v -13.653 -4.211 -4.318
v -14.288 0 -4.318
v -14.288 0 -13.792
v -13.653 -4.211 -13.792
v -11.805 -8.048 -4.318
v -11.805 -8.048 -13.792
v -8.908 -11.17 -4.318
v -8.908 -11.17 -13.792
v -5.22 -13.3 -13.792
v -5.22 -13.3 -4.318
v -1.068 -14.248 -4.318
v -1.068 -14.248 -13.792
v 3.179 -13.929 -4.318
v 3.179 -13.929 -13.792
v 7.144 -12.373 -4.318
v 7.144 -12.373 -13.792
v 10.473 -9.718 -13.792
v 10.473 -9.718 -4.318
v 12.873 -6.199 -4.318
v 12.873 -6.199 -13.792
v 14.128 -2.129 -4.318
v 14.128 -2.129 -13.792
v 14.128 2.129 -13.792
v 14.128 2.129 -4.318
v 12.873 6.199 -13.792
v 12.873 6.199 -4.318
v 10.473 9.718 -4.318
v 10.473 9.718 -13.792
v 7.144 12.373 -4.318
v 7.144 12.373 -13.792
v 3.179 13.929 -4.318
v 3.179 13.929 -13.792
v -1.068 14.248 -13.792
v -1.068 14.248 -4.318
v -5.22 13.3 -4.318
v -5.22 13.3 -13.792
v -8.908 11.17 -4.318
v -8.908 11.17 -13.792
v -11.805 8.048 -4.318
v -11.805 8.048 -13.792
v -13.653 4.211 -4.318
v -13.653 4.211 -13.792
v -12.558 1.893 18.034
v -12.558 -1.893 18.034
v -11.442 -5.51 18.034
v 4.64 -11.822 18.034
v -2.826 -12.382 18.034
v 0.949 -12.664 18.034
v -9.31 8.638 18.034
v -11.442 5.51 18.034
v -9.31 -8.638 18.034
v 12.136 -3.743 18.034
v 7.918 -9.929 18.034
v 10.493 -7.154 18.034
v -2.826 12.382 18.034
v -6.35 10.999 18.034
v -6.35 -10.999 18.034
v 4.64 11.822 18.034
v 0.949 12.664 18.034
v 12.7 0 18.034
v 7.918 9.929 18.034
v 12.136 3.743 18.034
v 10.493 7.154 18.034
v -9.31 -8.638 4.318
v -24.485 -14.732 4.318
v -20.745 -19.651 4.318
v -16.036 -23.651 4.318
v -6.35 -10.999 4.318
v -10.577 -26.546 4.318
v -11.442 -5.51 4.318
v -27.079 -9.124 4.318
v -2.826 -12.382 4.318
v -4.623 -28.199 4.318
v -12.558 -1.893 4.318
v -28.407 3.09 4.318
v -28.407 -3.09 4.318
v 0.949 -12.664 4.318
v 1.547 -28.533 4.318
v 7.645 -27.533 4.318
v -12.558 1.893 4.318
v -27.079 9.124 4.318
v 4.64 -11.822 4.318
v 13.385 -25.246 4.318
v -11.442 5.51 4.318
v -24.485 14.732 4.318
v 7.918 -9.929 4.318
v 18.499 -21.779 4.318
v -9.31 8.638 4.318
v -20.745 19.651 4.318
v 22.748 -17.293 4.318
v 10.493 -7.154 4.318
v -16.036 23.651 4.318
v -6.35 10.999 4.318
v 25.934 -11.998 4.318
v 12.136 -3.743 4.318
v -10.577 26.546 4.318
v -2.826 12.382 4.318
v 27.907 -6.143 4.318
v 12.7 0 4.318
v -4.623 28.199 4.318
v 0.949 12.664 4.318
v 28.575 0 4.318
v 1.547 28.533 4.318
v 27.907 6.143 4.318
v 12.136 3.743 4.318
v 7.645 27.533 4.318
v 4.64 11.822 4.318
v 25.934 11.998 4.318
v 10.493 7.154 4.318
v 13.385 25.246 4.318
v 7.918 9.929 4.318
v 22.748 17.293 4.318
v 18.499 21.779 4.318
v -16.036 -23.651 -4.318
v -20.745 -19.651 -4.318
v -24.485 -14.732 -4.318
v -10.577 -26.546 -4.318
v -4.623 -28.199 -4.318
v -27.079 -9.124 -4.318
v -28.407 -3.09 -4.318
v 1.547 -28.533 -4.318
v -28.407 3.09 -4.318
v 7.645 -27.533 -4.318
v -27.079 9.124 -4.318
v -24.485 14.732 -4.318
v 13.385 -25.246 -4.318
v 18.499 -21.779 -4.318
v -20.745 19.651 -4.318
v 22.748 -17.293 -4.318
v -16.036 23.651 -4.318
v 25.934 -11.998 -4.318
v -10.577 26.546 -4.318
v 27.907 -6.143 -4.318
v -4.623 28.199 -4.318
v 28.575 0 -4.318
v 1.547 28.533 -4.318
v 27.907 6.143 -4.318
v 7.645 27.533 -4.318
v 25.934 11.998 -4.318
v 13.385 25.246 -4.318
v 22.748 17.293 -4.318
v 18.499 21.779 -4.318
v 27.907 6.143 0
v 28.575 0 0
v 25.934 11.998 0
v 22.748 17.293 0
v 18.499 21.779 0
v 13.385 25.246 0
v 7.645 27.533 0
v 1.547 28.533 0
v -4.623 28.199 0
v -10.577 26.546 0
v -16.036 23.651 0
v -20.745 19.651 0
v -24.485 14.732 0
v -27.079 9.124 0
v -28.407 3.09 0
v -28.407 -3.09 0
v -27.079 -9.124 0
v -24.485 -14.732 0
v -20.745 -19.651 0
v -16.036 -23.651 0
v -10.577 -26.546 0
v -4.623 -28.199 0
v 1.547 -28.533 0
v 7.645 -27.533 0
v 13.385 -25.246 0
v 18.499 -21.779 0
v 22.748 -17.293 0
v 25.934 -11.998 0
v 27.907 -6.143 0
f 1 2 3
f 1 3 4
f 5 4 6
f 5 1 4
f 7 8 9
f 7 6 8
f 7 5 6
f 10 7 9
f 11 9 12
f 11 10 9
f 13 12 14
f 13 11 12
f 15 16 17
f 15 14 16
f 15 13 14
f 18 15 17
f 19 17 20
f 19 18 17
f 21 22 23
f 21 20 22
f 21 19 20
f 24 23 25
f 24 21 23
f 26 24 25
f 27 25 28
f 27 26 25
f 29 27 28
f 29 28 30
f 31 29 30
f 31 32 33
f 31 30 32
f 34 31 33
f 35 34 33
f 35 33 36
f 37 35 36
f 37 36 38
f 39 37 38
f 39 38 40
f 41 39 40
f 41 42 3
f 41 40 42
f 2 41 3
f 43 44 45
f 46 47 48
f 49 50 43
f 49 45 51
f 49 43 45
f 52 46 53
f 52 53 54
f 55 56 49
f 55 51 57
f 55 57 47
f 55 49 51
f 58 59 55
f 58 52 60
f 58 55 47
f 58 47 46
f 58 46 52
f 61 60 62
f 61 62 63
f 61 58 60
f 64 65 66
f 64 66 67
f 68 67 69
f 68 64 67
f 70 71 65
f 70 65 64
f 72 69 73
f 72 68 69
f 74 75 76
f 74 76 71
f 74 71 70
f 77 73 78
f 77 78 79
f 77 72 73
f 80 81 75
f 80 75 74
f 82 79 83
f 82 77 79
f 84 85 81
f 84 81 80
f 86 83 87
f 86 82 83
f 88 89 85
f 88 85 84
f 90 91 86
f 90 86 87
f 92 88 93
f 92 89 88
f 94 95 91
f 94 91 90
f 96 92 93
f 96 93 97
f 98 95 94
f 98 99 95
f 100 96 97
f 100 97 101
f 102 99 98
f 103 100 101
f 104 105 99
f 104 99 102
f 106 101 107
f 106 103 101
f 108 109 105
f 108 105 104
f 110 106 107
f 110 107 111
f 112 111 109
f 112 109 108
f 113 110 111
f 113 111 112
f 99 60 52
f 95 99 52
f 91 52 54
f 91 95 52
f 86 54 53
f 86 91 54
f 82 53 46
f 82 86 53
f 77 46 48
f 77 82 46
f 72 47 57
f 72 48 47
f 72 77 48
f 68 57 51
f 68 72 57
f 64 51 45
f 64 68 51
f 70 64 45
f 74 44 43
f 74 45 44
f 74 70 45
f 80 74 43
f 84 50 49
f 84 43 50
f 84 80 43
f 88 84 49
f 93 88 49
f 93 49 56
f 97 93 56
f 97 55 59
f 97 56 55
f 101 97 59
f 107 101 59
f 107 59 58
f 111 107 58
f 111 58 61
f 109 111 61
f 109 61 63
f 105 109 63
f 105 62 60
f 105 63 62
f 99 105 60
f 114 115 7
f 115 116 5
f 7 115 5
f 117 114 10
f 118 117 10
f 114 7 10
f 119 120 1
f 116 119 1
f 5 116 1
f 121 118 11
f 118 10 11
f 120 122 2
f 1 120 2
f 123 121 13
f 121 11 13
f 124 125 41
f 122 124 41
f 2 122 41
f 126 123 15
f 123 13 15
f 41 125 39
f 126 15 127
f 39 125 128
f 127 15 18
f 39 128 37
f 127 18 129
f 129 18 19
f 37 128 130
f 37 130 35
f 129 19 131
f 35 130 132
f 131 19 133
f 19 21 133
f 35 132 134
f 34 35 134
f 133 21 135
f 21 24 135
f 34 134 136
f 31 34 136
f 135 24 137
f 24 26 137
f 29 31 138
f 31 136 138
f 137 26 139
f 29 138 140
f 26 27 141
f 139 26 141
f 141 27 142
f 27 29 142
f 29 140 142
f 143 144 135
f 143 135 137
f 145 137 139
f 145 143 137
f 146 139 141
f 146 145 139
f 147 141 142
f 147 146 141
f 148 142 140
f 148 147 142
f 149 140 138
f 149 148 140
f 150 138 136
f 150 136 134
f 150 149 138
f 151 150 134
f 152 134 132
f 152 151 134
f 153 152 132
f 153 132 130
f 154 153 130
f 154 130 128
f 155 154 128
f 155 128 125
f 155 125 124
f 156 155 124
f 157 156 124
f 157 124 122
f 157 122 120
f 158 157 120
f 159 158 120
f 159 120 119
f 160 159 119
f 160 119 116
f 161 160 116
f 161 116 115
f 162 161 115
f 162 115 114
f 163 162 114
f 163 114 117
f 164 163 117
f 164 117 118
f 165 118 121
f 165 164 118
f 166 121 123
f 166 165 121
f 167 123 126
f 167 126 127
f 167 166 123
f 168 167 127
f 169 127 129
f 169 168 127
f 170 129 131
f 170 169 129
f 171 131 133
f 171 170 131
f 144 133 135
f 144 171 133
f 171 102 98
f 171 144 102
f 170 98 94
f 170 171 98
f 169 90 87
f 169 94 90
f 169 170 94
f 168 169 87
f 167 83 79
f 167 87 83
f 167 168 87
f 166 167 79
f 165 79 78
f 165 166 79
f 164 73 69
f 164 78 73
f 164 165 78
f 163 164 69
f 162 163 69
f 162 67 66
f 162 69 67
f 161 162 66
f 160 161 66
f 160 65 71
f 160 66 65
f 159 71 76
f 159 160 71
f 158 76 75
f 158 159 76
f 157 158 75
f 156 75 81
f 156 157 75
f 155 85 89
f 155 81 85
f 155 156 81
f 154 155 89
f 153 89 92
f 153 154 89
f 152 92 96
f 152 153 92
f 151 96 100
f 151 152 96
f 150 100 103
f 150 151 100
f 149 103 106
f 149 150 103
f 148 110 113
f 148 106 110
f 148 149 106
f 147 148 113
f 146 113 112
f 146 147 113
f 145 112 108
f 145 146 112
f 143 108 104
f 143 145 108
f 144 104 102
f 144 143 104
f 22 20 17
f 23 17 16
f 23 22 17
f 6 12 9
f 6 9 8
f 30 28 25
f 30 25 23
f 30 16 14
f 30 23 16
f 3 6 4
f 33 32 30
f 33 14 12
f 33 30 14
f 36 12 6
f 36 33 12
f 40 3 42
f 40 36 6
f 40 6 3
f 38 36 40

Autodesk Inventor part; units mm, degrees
ref_plane "YZ Plane" through (0, 0, 0) normal (1, 0, 0) x (0, 1, 0)
ref_plane "XZ Plane" through (0, 0, 0) normal (0, 1, 0) x (-1, 0, 0)
ref_plane "XY Plane" through (0, 0, 0) normal (0, 0, 1) x (1, 0, 0)
sketch "Sketch1" plane through (0, 0, 0) normal (0, 0, 1) x (1, 0, 0)
  circle A0 centre (0, 0) radius 28.575
  dimension "d0" = 57.15
extrude "Extrusion1" add sketch "Sketch1" along normal mid plane 8.636
sketch "Sketch2" plane through (0, 0, 4.318) normal (0, 0, 1) x (1, 0, 0)
  circle A0 centre (0, 0) radius 12.7
  dimension "d3" = 25.4
extrude "Extrusion2" add sketch "Sketch2" along normal blind 13.716
sketch "Sketch3" plane through (0, 0, -4.318) normal (0, 0, -1) x (-1, 0, 0)
  circle A0 centre (0, 0) radius 14.2875
  dimension "d6" = 28.575
extrude "Extrusion3" add sketch "Sketch3" along normal blind 9.4742
properties part number "newCoupler"
